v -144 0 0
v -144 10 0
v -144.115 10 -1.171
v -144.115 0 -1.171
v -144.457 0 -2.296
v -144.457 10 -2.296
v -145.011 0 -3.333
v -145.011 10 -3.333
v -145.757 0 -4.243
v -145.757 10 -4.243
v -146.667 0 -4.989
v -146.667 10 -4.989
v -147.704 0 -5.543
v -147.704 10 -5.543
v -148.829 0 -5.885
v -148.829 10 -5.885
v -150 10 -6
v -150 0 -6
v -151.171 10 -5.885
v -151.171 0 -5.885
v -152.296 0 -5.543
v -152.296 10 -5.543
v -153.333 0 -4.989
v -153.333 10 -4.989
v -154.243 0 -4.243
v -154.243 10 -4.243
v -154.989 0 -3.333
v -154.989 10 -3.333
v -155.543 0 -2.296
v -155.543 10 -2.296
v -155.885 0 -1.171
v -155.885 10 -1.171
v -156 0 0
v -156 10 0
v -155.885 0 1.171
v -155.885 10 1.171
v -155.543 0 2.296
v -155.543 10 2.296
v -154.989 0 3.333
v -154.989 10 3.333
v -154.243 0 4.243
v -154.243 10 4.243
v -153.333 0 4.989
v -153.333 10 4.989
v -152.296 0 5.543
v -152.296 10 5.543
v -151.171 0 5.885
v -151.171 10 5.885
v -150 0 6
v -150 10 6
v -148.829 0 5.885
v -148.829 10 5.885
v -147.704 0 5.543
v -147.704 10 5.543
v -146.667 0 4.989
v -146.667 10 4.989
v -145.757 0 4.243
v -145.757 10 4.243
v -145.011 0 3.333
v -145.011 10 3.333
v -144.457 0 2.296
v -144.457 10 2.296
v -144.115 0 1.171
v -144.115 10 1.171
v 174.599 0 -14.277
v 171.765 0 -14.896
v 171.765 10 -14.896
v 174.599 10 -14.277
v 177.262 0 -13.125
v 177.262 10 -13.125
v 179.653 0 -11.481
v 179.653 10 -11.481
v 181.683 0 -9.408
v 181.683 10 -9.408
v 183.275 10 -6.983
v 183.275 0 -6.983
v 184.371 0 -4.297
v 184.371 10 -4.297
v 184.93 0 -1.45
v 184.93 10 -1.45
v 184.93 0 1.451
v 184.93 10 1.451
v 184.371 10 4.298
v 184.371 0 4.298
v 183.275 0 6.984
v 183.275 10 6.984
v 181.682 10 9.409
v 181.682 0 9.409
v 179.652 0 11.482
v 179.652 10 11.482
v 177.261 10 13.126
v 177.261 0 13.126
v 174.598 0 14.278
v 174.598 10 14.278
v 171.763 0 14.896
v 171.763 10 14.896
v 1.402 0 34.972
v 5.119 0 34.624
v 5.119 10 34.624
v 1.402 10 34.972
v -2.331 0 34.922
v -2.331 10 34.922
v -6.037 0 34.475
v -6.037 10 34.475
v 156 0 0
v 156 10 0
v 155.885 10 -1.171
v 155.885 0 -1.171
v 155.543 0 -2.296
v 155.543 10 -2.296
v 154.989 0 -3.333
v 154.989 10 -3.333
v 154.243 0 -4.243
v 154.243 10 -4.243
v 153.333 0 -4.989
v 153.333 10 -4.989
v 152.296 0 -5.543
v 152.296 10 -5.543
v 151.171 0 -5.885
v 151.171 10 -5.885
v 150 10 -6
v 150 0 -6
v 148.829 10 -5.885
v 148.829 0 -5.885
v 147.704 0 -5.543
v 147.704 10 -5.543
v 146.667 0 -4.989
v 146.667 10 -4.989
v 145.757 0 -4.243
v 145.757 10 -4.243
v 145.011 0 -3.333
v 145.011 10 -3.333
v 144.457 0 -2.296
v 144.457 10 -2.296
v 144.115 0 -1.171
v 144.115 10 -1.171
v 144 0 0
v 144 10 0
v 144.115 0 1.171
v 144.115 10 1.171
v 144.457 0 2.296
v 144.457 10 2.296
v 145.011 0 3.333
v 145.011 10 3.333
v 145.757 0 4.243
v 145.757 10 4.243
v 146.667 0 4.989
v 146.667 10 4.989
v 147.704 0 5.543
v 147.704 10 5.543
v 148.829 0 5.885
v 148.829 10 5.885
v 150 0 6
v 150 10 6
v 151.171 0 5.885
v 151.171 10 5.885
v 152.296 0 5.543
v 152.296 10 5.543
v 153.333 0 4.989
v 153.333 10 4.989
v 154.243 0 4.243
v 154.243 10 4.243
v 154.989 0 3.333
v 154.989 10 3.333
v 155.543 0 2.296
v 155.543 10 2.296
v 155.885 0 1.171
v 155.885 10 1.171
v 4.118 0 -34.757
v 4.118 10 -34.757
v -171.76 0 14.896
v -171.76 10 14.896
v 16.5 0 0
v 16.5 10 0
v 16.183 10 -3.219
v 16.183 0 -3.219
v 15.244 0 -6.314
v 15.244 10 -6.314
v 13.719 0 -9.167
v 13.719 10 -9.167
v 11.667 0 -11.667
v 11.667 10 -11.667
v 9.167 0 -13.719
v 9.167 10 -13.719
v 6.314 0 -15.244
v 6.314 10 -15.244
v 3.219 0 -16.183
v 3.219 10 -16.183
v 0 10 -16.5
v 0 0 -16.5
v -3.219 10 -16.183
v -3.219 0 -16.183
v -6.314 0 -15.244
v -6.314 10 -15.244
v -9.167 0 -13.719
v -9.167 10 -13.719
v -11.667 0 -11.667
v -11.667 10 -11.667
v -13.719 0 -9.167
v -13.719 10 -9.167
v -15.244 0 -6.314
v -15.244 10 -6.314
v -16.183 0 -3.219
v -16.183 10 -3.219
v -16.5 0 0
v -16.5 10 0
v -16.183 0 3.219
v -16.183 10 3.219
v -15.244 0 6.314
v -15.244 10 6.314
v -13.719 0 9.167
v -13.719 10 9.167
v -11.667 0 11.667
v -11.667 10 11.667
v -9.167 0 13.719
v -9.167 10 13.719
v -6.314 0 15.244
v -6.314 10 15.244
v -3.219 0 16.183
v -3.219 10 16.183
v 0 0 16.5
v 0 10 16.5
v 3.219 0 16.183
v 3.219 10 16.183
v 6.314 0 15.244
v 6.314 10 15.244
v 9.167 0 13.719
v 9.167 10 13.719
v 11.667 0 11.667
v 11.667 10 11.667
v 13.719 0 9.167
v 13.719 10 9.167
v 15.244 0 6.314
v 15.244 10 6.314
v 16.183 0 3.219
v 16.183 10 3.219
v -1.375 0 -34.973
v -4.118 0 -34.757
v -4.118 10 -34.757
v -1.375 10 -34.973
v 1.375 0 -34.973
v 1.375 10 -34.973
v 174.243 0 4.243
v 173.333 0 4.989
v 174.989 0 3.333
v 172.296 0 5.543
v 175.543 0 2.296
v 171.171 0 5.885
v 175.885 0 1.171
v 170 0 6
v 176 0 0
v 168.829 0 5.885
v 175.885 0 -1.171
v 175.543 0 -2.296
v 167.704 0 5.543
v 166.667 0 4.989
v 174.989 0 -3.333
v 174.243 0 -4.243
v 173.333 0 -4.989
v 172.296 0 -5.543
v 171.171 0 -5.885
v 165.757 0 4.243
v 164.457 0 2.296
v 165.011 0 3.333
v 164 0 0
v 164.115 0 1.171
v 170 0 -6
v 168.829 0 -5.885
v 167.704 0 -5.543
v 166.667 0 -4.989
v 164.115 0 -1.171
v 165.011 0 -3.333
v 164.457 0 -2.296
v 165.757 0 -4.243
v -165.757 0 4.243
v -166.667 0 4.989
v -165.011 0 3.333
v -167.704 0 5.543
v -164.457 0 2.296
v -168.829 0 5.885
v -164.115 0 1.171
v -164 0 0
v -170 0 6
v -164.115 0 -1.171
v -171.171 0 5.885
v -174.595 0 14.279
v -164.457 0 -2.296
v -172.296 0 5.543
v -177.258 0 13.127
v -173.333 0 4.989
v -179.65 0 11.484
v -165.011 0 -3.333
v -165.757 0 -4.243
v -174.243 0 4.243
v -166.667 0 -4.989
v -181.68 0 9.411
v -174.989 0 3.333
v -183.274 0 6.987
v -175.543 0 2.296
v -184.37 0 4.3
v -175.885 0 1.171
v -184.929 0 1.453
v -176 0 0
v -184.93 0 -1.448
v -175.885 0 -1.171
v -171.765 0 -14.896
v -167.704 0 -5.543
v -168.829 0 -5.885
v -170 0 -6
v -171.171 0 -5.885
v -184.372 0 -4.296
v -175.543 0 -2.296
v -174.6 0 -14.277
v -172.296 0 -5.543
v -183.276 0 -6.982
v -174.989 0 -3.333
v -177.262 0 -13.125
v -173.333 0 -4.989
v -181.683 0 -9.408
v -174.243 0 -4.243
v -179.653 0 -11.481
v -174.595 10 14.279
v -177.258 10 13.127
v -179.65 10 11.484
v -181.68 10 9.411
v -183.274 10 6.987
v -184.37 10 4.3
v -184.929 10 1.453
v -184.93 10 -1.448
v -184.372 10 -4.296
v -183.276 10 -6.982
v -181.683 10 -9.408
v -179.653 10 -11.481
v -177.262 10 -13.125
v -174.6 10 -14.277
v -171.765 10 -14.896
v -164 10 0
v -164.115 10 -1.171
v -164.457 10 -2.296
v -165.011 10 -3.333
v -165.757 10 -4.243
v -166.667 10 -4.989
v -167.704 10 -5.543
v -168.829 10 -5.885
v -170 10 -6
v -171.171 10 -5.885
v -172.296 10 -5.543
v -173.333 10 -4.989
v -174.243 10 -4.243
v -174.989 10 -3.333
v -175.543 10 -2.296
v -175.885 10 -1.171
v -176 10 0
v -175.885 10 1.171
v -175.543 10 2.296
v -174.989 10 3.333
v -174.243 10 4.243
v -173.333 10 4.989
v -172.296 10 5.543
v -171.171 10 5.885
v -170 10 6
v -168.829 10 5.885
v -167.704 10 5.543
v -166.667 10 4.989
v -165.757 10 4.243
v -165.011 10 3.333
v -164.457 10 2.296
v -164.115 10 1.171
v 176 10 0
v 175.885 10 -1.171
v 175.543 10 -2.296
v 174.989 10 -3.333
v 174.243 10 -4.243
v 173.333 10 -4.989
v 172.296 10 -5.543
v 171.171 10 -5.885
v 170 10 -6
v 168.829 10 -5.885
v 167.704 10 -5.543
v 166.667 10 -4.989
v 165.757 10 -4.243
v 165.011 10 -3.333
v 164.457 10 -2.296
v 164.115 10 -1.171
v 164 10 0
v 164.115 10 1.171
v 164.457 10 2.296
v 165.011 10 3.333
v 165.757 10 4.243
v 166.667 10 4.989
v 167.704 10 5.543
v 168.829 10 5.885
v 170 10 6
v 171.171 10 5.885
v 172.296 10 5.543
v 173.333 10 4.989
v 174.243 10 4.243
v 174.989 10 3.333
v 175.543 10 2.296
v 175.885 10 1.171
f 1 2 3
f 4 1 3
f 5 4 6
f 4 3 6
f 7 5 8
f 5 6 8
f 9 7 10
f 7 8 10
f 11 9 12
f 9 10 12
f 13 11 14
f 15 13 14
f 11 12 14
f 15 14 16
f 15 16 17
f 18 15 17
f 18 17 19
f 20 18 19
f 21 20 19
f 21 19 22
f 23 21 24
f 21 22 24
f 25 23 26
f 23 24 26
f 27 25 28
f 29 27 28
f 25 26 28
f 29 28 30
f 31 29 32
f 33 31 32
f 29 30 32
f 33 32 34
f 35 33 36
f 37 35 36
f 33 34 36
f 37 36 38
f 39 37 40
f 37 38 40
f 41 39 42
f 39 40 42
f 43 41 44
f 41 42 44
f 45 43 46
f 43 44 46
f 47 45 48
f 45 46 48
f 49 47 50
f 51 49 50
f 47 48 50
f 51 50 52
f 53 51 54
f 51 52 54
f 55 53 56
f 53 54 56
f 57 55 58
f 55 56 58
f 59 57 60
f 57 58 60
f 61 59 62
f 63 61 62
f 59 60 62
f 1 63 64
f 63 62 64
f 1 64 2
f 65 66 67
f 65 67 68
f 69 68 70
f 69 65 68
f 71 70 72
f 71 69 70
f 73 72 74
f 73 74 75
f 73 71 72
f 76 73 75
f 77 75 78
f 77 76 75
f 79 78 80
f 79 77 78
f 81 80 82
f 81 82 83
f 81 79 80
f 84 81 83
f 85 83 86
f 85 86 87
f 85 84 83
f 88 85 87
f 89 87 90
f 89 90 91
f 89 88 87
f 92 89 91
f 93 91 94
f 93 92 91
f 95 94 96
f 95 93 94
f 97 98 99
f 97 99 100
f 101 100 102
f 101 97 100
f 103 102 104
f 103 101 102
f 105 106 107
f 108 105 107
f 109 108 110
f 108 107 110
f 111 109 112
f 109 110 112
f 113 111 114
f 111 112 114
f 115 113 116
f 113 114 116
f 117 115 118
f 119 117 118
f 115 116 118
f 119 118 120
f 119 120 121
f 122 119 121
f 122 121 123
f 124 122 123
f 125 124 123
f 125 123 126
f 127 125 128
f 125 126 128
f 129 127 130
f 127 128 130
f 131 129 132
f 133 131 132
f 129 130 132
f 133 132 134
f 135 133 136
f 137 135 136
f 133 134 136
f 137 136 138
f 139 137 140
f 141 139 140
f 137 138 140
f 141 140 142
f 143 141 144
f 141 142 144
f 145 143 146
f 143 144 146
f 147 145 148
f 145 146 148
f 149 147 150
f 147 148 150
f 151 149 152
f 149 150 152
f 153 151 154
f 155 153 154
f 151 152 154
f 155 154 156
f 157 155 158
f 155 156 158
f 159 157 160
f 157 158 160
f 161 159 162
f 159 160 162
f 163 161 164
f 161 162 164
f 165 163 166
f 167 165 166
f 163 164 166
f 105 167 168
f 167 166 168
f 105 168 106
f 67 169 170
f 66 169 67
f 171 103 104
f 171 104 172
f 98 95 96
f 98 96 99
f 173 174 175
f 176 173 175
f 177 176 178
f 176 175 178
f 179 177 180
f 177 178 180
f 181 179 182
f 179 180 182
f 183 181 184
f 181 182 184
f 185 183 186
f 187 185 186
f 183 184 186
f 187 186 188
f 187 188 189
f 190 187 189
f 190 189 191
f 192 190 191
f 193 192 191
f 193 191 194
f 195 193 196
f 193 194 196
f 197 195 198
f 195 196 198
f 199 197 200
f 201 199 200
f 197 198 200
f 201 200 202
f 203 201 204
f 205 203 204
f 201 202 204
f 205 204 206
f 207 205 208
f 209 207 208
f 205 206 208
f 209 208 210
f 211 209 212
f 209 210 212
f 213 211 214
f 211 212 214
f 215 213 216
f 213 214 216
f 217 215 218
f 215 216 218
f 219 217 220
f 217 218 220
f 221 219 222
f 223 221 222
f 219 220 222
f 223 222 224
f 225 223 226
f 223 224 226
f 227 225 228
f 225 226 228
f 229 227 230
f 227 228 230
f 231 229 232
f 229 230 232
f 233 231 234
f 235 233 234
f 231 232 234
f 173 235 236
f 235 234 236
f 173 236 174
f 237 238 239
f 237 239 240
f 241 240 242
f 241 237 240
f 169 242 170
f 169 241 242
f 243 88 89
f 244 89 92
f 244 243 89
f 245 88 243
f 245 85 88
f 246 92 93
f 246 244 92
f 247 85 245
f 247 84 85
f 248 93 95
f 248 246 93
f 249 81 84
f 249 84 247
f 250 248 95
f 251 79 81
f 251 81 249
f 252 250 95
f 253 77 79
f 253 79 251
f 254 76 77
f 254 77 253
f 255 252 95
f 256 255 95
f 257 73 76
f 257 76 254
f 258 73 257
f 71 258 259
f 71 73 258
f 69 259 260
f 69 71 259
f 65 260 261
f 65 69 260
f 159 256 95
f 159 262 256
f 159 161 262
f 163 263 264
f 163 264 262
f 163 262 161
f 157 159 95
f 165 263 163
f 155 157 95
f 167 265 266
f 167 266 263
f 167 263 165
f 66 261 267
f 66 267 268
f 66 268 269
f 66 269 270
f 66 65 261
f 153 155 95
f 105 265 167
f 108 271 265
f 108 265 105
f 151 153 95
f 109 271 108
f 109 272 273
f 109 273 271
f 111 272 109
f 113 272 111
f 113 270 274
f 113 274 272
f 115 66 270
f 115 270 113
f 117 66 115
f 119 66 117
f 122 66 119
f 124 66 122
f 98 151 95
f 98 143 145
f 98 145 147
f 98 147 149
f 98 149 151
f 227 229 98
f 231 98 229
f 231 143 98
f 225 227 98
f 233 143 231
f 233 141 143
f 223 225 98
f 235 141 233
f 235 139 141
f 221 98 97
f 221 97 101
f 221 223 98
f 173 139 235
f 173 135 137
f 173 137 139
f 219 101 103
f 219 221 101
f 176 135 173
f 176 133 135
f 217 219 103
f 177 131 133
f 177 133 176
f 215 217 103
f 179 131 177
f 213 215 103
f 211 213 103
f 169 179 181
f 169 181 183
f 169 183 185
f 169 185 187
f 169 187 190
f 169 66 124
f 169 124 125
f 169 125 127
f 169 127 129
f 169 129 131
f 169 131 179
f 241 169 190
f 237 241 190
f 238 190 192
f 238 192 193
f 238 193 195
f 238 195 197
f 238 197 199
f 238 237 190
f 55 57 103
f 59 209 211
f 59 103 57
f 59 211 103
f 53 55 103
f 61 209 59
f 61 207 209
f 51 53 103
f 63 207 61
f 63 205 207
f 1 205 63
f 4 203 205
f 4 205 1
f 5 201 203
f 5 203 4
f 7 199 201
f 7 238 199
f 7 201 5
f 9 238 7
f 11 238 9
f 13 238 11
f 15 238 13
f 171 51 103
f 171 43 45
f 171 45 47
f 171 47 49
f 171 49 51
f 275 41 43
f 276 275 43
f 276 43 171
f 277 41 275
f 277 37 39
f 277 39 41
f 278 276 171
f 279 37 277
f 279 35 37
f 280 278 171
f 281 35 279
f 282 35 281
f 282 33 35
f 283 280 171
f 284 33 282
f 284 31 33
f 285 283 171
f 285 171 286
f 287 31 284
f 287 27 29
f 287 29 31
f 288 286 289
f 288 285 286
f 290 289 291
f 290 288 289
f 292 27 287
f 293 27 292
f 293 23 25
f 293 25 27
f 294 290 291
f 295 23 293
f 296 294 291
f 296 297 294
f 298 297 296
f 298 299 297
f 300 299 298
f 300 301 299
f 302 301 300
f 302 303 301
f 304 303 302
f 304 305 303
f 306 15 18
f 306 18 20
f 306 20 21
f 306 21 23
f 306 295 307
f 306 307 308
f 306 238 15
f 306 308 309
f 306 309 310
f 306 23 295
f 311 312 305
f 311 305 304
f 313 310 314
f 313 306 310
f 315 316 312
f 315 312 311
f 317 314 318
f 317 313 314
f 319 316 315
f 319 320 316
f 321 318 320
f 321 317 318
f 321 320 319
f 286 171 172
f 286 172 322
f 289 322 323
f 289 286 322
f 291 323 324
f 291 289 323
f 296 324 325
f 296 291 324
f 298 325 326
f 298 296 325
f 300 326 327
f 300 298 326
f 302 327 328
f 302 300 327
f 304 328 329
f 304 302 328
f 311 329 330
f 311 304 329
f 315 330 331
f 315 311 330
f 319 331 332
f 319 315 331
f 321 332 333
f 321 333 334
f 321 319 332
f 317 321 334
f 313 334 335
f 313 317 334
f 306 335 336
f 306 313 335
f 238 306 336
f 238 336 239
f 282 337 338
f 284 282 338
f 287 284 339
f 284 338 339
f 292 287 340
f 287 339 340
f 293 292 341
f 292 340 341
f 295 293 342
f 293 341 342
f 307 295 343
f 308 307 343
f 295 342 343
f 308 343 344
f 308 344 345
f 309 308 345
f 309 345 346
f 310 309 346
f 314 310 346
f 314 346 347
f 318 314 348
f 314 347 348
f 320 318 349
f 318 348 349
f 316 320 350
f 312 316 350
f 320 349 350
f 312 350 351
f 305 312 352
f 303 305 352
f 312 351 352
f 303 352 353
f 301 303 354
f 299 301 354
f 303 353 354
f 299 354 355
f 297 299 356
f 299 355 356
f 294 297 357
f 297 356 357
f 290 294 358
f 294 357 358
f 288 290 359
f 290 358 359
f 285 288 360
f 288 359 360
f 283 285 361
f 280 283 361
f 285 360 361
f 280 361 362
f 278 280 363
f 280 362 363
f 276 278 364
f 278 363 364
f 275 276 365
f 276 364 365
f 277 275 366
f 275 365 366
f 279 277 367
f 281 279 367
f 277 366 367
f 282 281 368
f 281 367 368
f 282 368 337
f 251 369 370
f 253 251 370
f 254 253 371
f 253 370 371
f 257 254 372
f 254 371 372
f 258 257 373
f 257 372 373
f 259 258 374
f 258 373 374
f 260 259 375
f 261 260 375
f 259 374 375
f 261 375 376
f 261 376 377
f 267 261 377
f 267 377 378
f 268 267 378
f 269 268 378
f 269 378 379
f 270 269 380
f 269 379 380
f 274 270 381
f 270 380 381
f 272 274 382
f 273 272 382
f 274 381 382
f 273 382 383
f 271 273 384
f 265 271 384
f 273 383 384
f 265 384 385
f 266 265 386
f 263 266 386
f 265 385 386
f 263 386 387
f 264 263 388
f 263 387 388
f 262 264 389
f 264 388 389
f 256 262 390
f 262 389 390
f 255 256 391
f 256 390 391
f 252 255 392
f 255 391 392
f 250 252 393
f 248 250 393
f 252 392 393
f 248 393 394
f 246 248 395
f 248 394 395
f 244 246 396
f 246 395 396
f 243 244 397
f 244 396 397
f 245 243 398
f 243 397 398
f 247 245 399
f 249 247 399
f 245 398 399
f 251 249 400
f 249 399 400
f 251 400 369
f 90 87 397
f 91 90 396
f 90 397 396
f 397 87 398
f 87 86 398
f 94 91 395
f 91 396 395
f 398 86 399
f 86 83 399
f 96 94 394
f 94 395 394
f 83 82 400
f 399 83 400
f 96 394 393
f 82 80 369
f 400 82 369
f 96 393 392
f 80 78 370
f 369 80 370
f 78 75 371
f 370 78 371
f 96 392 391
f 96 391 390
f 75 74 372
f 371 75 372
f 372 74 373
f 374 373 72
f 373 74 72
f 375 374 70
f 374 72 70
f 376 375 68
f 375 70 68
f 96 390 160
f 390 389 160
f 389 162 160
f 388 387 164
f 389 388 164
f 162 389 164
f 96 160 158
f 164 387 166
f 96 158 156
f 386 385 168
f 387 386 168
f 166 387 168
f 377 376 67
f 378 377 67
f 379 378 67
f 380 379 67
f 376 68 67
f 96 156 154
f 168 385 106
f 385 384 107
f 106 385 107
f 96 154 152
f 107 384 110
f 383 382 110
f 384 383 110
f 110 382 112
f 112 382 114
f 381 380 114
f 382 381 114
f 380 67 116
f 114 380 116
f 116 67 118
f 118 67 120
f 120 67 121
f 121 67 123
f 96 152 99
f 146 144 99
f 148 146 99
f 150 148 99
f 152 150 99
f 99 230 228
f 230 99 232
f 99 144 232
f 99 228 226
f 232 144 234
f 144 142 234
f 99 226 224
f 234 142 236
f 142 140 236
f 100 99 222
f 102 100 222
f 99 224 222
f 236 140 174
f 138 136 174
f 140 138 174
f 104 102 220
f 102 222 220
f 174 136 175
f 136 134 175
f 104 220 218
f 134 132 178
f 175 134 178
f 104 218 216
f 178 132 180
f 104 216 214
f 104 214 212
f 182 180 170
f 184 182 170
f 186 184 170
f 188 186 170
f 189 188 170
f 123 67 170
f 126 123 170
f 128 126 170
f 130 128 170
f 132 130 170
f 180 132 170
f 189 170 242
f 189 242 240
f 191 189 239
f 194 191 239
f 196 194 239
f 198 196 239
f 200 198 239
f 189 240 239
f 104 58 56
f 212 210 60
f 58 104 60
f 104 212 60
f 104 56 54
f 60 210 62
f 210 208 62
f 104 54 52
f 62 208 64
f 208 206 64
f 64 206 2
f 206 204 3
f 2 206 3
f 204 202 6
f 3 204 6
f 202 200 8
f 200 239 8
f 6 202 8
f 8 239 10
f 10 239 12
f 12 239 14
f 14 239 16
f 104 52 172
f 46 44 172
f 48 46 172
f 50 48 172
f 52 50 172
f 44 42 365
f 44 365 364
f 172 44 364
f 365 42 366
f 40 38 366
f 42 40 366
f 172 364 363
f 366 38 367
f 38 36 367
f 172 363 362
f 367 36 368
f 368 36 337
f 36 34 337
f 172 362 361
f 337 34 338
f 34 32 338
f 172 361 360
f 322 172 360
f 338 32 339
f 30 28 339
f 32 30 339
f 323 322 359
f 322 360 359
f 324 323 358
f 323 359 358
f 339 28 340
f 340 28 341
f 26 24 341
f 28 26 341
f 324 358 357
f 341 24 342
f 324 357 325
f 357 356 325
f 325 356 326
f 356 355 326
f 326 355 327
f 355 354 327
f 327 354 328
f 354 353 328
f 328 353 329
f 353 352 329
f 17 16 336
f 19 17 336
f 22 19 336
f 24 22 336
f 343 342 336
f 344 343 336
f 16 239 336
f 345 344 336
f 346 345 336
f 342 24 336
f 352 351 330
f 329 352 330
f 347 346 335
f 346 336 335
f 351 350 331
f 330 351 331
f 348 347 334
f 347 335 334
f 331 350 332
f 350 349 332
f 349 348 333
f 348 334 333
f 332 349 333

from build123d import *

# Parameters (mm, degrees)
BOSS_EXTRUDE2_DEPTH = 10
SKETCH3_R           = 6
CUT_EXTRUDE1_DEPTH  = 10
SKETCH4_R           = 16.5
CUT_EXTRUDE2_DEPTH  = 10


with BuildPart() as part:
    # Sketch1 → Boss-Extrude2 (new body)
    with BuildSketch(Plane(origin=(0, 0, 0), x_dir=(1, 0, 0), z_dir=(0, 1, 0))):
        with BuildLine():
            Line((-171.764705882, 14.895832073), (-4.117647059, 34.756941504))
            ThreePointArc((-4.117647059, 34.756941504), (0, 35), (4.117647059, 34.756941504))
            Line((4.117647059, 34.756941504), (171.764705882, 14.895832073))
            ThreePointArc((171.764705882, 14.895832073), (184.999999986, -0.000651143), (171.763412633, -14.895985227))
            Line((171.763412633, -14.895985227), (5.118683106, -34.623678072))
            ThreePointArc((5.118683106, -34.623678072), (-0.464934327, -34.996911808), (-6.036666108, -34.475479145))
            Line((-6.036666108, -34.475479145), (-171.759908797, -14.896399599))
            ThreePointArc((-171.759908797, -14.896399599), (-184.999999806, -0.00241527), (-171.764705882, 14.895832073))
        make_face()
    extrude(amount=BOSS_EXTRUDE2_DEPTH)

    # Sketch3 → Cut-Extrude1 (cut)
    with BuildSketch(Plane(origin=(0, 10, 0), x_dir=(1, 0, 0), z_dir=(0, 1, 0))):
        with Locations((170, 0)):
            Circle(SKETCH3_R)
        with Locations((-170, 0)):
            Circle(SKETCH3_R)
        with Locations((-150, 0)):
            Circle(SKETCH3_R)
        with Locations((150, 0)):
            Circle(SKETCH3_R)
    extrude(amount=-CUT_EXTRUDE1_DEPTH, mode=Mode.SUBTRACT)

    # Sketch4 → Cut-Extrude2 (cut)
    with BuildSketch(Plane(origin=(0, 10, 0), x_dir=(1, 0, 0), z_dir=(0, 1, 0))):
        Circle(SKETCH4_R)
    extrude(amount=-CUT_EXTRUDE2_DEPTH, mode=Mode.SUBTRACT)


solid = part.part
